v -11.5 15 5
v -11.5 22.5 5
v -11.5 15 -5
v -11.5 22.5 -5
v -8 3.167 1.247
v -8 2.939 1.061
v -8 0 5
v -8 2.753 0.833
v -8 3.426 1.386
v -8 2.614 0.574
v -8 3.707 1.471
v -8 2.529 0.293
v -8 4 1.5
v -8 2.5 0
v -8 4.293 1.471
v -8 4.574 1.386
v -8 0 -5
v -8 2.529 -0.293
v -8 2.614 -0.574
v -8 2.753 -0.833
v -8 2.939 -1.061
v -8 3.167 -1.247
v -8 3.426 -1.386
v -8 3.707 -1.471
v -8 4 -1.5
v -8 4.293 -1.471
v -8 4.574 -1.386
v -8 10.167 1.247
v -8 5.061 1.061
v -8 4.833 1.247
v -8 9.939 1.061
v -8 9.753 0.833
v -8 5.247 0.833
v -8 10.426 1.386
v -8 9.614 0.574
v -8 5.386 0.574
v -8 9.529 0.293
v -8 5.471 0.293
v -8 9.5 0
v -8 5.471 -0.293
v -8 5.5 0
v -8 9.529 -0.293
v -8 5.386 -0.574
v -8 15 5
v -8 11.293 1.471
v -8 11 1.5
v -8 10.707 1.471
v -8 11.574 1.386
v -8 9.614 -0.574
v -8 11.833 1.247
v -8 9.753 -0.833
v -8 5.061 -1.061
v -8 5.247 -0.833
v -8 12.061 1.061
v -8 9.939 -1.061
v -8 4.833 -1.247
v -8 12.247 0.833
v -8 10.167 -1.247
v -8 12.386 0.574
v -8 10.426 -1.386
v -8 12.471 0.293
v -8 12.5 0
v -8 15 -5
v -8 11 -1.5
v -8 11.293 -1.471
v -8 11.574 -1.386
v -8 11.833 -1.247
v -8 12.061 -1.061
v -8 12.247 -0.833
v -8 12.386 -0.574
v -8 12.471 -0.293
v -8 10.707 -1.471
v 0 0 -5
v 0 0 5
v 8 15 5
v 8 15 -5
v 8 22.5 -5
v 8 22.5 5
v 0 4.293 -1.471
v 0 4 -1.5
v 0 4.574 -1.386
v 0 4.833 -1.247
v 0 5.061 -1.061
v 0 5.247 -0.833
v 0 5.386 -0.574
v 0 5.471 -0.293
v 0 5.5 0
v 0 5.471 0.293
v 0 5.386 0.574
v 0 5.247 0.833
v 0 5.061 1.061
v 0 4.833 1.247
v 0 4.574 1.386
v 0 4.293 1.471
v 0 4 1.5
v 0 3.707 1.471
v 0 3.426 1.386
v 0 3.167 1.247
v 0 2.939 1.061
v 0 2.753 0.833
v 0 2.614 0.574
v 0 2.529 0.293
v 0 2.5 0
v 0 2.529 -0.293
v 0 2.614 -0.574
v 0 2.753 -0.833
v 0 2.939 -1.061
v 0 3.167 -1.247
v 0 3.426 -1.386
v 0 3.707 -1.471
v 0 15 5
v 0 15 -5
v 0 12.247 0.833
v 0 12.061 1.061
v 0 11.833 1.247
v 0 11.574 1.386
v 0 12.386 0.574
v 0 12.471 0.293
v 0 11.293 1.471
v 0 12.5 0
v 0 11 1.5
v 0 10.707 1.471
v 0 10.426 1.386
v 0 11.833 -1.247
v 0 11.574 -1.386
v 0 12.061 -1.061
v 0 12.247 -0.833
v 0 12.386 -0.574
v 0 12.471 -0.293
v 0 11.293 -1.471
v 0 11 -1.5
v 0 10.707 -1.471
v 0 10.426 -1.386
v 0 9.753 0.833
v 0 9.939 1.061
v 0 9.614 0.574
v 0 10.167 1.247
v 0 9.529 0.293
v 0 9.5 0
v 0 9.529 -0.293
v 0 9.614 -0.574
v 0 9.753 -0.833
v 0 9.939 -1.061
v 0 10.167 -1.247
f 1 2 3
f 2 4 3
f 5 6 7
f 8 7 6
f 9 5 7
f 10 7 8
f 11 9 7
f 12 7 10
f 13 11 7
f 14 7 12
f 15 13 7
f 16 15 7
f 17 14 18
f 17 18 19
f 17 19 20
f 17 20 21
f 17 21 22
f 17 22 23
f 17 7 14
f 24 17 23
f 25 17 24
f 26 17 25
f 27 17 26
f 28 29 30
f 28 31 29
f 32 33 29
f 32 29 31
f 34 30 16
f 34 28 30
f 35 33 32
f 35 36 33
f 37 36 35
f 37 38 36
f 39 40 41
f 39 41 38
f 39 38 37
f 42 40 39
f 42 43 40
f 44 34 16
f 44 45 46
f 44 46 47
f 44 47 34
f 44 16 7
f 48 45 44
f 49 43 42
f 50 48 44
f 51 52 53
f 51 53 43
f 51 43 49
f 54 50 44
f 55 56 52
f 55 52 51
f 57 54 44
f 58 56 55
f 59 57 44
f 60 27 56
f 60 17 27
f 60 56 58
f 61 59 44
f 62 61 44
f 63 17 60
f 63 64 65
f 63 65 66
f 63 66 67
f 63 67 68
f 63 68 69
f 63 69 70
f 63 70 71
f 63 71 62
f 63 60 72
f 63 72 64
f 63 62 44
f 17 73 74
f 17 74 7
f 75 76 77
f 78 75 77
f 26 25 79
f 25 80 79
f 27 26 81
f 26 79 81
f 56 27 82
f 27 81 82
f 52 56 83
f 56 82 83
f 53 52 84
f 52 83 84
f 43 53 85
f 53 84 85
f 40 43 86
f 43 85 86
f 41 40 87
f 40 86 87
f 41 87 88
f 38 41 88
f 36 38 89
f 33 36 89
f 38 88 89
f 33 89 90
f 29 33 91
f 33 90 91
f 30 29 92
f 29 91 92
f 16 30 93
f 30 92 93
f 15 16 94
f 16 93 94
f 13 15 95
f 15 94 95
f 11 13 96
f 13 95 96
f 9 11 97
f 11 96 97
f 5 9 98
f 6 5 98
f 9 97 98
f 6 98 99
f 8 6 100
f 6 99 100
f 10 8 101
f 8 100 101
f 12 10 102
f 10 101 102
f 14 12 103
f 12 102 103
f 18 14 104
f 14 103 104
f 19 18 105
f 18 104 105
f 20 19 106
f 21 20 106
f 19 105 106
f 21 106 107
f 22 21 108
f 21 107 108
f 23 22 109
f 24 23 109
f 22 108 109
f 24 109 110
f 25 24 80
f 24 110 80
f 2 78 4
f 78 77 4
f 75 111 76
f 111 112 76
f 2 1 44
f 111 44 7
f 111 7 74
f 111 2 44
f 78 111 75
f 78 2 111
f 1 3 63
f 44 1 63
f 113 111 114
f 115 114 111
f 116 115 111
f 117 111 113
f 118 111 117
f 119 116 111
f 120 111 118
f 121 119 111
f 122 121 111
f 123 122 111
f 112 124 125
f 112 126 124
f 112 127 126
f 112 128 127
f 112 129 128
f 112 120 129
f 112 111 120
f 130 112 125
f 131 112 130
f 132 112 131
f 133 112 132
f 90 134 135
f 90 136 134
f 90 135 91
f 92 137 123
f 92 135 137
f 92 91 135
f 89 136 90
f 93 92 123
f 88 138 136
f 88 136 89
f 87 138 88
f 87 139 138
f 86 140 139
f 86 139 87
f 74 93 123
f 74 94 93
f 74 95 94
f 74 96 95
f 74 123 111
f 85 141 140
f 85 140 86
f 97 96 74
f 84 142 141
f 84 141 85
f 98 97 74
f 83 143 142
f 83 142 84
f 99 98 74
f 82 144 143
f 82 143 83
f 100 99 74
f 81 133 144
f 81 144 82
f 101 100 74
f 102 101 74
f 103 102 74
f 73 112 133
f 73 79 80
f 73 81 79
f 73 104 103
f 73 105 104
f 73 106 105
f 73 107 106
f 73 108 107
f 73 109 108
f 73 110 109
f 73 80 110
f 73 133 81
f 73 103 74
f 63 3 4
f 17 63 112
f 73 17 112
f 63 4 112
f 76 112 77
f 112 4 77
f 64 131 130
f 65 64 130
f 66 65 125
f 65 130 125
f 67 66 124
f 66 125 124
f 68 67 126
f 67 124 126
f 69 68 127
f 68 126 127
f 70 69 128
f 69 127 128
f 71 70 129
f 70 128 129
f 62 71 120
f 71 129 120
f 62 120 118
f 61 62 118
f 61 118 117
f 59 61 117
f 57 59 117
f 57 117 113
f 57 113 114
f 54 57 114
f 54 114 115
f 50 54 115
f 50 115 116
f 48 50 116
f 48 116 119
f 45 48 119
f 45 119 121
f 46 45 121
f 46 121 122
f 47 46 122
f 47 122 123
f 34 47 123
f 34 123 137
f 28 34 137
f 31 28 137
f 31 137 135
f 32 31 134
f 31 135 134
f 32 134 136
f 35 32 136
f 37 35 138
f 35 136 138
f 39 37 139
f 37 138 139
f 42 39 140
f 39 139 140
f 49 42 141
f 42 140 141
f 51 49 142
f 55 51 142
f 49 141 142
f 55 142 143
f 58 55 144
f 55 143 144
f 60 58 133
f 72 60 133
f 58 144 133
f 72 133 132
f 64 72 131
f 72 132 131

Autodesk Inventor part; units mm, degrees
ref_plane "YZ Plane" through (0, 0, 0) normal (1, 0, 0) x (0, 1, 0)
ref_plane "XZ Plane" through (0, 0, 0) normal (0, 1, 0) x (-1, 0, 0)
ref_plane "XY Plane" through (0, 0, 0) normal (0, 0, 1) x (1, 0, 0)
sketch "Sketch1" plane through (0, 0, 0) normal (0, 0, 1) x (1, 0, 0)
  line L0 (0, 0) -> (-8, 0)
  line L1 (-8, 0) -> (-8, 15)
  line L2 (-8, 15) -> (0, 15)
  line L3 (0, 15) -> (0, 0)
  line L4 (8, 22.5) -> (-11.5, 22.5)
  line L5 (-11.5, 22.5) -> (-11.5, 15)
  line L6 (-11.5, 15) -> (8, 15)
  line L7 (8, 15) -> (8, 22.5)
  line L8 (0, 15) -> (1, 15)
  line L9 (0, 14) -> (0, 15)
  point P0 (0.5, 15)
  point P1 (0.5, 14)
  dimension "d0" = 15
  dimension "d1" = 1
  dimension "d3" = 19.5
  dimension "d4" = 3.5
  dimension "d5" = 8
  dimension "d6" = 7.5
extrude "Extrusion1" add sketch "Sketch1" along normal mid plane 10
sketch "Sketch2" plane through (0, 0, 5) normal (1, 0, 0) x (0, 0, -1)
  circle A0 centre (5, 4) radius 1.5
  circle A1 centre (5, 11) radius 1.5
  line L0 (10, 14) -> (0, 14) projected
  line L1 (10, 0) -> (0, 0) projected
  line L2 (10, 15) -> (0, 15) projected
  point P0 (5, 0)
  point P1 (5, 0)
  point P2 (5, 0)
  dimension "d9" = 3
  dimension "d10" = 3
  dimension "d12" = 7
  dimension "d19" = 4
extrude "Extrusion2" cut sketch "Sketch2" against normal through all
thread "Thread1" size "M3x0.5" class "6H" standard "ANSI Metric M Profile" full length
thread "Thread2" size "M3x0.5" class "6H" standard "ANSI Metric M Profile" full length
properties part number "Connector2"
